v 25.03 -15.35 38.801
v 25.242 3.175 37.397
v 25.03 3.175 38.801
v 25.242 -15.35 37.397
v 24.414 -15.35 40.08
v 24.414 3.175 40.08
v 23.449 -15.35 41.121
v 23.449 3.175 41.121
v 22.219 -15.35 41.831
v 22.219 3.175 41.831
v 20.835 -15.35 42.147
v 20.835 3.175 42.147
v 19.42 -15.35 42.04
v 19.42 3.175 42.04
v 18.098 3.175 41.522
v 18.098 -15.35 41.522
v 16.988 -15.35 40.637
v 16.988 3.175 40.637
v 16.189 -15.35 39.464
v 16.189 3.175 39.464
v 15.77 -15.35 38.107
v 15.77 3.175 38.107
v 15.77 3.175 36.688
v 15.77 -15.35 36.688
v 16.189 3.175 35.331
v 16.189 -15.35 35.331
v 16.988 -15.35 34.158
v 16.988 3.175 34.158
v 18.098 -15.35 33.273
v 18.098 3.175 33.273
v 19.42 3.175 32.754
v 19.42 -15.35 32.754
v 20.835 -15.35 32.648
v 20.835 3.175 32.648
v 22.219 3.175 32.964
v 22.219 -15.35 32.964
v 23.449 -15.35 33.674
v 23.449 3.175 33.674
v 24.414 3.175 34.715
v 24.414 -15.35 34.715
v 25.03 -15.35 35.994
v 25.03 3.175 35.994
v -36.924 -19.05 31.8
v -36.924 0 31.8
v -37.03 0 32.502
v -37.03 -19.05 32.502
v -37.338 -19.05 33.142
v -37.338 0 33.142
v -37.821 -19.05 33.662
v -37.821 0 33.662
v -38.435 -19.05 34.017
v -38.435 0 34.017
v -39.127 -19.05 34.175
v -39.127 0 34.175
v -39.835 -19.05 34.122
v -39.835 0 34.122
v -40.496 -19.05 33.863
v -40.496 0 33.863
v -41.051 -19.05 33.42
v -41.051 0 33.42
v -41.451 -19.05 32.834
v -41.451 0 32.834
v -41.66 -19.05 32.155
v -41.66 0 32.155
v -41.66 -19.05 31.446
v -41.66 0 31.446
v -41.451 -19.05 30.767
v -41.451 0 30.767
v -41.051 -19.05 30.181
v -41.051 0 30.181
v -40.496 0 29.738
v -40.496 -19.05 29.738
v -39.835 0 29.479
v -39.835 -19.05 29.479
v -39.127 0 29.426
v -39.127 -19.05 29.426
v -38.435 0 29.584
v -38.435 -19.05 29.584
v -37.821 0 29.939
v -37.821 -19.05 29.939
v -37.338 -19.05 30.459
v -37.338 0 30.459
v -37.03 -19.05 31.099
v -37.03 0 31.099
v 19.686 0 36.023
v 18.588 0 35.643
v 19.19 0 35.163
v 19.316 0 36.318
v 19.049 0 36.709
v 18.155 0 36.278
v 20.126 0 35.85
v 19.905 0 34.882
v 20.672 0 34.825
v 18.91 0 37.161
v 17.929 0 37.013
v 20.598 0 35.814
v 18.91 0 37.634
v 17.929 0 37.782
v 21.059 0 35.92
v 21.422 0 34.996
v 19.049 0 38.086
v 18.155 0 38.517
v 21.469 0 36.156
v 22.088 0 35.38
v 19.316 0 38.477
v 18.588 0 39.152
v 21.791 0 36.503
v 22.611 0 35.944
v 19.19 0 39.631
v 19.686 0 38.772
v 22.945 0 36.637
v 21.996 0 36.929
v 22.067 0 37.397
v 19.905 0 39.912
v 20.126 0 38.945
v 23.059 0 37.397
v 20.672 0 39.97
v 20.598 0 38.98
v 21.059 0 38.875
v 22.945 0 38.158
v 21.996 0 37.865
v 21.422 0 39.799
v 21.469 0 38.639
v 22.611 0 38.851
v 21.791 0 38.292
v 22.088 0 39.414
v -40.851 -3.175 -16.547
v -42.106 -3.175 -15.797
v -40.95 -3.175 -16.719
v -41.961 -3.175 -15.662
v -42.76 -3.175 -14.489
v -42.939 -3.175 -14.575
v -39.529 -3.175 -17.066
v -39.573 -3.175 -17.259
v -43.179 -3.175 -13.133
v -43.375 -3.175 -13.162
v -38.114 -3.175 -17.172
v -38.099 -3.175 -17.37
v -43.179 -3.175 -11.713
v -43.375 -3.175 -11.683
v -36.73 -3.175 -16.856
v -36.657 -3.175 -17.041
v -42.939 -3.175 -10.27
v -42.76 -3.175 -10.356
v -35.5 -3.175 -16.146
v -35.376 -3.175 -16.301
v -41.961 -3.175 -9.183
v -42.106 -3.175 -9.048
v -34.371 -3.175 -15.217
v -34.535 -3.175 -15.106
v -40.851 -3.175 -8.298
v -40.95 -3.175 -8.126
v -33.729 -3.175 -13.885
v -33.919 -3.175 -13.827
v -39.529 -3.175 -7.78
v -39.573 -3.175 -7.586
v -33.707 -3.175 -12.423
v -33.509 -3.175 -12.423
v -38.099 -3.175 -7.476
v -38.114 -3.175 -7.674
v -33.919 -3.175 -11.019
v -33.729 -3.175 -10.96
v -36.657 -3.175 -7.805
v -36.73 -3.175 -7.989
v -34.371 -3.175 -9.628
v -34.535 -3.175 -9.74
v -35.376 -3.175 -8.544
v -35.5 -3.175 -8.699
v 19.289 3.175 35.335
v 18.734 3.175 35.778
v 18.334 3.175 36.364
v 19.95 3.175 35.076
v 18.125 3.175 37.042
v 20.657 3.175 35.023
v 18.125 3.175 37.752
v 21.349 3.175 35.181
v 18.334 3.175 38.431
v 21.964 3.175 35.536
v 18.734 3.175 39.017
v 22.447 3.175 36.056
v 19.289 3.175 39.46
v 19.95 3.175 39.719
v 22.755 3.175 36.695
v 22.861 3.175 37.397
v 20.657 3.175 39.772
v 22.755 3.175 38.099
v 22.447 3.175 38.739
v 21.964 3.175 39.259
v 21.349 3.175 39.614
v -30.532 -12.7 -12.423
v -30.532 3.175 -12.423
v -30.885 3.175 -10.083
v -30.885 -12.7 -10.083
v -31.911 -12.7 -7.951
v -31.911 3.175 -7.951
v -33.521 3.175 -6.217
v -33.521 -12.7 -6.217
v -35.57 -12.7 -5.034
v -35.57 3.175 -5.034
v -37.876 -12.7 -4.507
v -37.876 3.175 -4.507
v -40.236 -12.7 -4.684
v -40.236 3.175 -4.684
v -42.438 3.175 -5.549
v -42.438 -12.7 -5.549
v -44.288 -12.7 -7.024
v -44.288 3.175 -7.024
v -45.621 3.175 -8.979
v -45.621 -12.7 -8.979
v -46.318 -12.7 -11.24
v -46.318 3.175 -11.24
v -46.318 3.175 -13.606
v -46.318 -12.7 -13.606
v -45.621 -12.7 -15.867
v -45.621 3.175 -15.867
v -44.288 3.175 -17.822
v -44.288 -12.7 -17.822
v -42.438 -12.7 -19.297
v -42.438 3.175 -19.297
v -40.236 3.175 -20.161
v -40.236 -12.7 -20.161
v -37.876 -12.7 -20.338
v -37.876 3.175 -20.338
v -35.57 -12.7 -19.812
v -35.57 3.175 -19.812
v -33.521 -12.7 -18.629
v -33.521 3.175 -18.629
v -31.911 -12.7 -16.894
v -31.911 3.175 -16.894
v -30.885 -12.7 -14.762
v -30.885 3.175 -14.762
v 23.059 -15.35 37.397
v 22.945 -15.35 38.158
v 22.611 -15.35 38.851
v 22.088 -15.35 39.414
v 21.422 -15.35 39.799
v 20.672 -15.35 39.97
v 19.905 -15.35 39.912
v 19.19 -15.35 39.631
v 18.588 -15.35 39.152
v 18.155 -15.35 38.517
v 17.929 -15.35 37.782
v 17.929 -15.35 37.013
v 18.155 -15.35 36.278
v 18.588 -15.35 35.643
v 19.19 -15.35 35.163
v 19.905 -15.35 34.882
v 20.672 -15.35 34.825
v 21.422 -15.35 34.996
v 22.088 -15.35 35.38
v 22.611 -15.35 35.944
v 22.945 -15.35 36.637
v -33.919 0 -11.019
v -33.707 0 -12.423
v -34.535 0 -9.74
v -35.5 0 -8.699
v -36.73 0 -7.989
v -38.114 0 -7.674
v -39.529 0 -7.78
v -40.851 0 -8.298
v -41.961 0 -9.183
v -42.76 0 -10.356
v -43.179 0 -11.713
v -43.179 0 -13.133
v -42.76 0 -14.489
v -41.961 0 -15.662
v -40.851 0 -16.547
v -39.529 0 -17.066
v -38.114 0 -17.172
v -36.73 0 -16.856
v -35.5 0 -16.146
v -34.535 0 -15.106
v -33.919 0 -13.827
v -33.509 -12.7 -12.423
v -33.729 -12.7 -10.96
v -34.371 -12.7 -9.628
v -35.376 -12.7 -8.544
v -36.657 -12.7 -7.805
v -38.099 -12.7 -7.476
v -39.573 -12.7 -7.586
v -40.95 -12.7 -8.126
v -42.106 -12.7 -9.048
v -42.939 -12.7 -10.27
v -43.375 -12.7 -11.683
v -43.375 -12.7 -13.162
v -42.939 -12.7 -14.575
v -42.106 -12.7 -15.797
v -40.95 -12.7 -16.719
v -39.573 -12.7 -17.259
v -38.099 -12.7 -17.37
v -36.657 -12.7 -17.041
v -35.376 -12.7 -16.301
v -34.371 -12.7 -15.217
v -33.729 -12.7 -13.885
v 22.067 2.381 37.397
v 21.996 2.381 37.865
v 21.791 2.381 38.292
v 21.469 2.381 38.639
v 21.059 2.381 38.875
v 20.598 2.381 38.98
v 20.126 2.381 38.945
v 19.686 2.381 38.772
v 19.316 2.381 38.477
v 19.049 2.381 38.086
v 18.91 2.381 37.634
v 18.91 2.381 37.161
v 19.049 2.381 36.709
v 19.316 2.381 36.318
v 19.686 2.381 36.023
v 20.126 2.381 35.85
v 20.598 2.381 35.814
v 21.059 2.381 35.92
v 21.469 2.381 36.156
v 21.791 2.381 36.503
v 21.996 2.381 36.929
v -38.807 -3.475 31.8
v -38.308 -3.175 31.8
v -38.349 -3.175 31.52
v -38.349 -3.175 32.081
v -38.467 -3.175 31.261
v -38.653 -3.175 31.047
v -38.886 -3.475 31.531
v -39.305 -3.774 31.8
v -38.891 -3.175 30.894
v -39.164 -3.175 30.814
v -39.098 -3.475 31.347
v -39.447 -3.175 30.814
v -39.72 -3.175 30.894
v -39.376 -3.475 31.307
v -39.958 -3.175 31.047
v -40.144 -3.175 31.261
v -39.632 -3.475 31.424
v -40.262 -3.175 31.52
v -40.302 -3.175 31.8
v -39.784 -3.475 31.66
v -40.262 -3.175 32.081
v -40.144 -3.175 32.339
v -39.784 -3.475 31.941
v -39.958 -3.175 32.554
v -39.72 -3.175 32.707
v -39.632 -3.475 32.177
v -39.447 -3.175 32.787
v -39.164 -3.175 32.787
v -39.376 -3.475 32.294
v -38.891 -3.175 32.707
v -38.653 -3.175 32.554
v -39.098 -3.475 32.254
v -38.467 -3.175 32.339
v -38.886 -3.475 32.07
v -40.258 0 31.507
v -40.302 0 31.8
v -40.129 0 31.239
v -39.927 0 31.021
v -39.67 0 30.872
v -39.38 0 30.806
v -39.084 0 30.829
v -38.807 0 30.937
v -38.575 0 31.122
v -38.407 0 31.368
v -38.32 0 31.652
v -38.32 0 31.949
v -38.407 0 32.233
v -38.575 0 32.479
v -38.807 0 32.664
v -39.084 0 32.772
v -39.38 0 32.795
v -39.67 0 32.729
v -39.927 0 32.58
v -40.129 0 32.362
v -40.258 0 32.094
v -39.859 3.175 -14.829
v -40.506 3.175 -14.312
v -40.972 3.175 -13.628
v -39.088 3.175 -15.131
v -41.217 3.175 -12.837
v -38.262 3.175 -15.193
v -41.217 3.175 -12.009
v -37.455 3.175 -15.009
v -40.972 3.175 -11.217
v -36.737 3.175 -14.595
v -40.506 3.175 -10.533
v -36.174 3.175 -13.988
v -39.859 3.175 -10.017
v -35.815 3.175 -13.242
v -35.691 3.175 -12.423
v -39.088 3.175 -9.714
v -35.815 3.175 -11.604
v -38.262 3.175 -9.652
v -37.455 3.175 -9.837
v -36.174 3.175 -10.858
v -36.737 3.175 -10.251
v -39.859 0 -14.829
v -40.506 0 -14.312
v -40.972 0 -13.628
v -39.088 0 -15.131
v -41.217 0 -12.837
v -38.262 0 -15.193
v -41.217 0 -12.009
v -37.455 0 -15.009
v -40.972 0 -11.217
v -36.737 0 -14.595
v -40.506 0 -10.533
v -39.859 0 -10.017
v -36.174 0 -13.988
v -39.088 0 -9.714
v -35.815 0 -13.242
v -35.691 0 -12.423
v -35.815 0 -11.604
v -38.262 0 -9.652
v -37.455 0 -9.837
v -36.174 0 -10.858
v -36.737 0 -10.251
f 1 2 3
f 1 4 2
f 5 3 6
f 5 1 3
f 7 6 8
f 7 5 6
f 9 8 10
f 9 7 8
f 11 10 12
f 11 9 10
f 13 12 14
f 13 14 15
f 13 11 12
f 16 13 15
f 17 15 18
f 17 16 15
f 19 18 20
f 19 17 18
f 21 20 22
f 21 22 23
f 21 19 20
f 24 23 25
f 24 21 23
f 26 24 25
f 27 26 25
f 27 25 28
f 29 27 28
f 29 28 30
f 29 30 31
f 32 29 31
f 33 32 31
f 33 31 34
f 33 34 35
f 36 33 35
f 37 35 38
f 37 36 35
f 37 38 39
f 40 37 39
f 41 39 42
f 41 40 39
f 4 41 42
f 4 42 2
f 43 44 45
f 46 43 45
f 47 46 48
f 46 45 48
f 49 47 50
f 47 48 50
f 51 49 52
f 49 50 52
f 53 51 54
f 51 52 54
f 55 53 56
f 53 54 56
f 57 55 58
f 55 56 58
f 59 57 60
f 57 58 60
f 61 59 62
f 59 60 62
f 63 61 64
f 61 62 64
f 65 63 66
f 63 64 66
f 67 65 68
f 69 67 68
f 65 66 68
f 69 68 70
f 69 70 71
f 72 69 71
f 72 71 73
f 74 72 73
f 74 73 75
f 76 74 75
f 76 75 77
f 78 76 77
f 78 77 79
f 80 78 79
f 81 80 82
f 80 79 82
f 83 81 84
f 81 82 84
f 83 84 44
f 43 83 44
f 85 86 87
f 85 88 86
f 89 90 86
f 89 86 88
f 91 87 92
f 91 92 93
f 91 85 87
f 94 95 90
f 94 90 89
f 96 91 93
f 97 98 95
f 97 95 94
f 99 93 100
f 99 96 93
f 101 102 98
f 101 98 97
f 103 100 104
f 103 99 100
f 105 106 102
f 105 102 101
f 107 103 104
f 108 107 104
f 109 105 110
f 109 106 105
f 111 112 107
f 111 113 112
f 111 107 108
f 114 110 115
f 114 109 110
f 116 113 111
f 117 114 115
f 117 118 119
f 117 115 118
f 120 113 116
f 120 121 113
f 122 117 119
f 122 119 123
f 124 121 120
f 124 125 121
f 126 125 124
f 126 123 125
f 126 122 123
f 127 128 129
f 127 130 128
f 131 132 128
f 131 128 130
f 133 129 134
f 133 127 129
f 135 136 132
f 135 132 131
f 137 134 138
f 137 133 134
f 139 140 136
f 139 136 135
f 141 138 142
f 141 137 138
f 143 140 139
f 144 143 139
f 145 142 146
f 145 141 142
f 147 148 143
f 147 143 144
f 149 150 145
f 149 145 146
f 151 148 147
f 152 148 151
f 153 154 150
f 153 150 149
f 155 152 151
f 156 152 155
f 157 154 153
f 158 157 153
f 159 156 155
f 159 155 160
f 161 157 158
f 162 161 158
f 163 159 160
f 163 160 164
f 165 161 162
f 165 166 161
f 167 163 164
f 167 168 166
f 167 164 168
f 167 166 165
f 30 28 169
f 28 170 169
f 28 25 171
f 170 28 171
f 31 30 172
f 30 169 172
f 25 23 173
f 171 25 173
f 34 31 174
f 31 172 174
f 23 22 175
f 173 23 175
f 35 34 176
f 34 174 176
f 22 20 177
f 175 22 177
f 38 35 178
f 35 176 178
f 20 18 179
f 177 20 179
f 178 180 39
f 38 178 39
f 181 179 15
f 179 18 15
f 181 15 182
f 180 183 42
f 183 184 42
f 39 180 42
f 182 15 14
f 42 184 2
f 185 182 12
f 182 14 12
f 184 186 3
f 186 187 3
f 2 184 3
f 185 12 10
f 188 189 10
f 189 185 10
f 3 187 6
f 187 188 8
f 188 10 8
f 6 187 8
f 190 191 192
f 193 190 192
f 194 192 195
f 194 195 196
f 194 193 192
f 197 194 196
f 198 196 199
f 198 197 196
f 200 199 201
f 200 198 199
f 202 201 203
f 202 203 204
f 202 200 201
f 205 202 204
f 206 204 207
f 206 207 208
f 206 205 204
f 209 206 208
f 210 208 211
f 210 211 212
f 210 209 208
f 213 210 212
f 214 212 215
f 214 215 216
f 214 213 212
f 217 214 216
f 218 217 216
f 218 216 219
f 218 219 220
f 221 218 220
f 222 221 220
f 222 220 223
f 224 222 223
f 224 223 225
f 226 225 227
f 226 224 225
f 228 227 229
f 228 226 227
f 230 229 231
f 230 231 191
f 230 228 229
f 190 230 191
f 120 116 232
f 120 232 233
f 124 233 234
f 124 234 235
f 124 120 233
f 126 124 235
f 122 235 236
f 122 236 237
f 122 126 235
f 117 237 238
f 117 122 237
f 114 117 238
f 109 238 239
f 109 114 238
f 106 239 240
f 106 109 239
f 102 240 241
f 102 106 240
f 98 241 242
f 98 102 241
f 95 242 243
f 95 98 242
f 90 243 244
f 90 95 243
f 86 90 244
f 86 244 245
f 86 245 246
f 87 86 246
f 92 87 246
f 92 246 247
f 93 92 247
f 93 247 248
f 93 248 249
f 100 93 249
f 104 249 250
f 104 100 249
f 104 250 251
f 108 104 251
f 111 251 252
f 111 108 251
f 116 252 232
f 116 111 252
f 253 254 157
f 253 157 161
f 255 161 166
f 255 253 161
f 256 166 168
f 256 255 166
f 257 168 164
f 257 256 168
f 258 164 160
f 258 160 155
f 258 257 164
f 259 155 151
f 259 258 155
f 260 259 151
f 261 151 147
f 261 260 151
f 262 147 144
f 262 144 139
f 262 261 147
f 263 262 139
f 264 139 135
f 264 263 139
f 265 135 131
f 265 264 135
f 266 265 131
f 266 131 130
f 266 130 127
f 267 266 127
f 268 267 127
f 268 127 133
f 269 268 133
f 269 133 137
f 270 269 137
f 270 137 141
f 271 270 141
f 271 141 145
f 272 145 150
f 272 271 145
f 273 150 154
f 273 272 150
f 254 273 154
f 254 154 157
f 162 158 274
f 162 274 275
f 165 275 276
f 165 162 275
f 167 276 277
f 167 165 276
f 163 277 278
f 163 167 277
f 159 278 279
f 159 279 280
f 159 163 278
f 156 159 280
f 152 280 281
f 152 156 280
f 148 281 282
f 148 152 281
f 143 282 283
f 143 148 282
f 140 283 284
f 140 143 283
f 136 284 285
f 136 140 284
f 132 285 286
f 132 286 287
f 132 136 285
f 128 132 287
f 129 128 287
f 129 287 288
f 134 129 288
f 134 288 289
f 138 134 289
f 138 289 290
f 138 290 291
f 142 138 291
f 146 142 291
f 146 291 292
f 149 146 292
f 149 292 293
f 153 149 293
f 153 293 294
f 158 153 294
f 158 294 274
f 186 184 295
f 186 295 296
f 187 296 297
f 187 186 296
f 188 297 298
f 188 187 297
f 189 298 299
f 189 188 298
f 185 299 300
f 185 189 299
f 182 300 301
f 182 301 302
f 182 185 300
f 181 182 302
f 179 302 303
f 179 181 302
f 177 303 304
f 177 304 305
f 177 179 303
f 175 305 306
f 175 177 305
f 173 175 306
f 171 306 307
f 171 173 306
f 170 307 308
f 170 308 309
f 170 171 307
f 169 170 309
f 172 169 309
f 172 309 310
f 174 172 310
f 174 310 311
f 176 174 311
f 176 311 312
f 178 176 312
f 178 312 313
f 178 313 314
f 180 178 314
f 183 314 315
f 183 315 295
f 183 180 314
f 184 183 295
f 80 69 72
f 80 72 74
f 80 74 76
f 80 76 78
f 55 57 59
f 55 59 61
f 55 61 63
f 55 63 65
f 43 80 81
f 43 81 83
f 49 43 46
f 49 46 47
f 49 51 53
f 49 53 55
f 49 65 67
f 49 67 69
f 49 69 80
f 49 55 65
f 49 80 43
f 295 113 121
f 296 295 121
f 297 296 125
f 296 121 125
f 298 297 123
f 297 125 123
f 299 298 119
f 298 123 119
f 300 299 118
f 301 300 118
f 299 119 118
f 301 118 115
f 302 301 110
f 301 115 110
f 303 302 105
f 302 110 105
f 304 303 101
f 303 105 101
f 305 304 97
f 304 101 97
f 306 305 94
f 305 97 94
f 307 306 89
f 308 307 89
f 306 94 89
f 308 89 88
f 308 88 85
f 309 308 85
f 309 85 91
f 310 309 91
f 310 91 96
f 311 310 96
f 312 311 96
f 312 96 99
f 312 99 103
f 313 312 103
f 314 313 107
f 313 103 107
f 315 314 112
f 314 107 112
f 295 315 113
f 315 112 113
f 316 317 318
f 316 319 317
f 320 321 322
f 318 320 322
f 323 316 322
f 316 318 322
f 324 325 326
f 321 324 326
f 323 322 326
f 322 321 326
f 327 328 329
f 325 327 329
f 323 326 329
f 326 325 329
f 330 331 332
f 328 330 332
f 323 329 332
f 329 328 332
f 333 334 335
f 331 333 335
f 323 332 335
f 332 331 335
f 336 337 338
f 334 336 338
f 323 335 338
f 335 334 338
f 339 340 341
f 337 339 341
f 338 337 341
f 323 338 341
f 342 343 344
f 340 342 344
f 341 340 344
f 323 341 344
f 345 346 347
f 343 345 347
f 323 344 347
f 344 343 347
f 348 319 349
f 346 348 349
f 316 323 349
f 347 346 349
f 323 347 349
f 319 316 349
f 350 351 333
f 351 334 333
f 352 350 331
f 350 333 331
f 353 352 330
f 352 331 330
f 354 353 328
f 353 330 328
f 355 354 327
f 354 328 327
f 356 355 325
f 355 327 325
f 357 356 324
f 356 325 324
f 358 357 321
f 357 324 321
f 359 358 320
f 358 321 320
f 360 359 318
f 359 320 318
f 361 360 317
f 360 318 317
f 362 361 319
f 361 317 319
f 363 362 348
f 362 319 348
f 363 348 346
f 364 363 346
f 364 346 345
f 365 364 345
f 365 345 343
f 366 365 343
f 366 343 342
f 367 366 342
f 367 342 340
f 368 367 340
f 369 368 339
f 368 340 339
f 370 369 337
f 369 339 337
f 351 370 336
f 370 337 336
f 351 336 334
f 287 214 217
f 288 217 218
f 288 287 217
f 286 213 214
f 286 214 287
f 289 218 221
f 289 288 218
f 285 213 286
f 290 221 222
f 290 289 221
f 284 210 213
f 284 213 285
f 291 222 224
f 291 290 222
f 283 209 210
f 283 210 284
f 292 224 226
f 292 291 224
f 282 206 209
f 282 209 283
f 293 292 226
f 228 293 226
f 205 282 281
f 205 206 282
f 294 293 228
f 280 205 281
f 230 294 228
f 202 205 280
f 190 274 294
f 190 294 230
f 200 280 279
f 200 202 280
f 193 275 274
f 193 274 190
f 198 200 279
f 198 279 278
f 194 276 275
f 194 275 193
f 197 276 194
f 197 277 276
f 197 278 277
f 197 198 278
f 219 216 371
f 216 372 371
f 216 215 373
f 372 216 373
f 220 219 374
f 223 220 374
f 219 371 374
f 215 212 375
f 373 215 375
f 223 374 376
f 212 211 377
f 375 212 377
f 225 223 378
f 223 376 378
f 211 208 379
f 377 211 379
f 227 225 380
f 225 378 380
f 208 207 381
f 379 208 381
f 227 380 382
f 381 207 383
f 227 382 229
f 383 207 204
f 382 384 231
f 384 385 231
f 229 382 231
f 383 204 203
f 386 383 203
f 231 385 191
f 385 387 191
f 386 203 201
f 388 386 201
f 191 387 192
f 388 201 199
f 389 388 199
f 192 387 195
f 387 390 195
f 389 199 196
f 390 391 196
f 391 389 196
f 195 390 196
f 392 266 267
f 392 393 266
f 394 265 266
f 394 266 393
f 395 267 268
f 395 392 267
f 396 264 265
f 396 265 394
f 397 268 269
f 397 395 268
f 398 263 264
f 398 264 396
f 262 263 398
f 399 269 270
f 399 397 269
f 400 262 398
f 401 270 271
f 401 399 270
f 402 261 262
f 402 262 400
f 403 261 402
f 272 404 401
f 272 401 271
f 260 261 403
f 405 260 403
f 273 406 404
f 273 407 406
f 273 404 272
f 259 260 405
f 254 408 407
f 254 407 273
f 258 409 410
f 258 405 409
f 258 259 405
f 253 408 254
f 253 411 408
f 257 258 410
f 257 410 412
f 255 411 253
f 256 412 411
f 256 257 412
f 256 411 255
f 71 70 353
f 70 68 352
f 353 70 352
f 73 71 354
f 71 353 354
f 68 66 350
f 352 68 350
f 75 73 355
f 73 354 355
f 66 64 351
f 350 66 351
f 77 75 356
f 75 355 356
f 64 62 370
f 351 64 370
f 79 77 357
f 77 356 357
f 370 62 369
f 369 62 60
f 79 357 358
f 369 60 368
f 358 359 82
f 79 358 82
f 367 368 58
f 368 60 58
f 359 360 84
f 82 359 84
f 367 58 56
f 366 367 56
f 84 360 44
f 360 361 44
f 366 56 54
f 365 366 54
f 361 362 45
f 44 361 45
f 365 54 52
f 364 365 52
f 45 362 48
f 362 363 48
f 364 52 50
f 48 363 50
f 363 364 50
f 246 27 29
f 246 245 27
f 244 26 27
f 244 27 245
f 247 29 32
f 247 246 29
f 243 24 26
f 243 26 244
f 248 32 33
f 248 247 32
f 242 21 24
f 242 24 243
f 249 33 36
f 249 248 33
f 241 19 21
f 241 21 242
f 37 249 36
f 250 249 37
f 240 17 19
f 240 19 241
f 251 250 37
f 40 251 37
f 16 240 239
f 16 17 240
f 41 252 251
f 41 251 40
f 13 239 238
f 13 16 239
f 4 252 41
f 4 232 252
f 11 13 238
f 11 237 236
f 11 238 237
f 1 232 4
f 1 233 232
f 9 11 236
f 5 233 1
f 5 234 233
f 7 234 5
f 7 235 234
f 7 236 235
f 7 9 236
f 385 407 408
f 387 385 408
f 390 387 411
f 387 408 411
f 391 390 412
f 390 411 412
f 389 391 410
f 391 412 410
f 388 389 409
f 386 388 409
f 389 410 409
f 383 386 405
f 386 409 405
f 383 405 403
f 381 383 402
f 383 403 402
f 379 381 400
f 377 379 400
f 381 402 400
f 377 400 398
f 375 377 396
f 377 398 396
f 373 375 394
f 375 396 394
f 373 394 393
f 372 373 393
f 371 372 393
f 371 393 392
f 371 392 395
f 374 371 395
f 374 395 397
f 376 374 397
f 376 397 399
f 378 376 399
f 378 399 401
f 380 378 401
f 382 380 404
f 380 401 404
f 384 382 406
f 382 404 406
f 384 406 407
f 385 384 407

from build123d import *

# Parameters (mm, degrees)
F0_R      = 2.38125
F1_DEPTH  = 19.05
F2_R      = 4.7625
F2_R_2    = 2.5796875
F3_DEPTH  = 15.35
F2_R_3    = 1.5875
F4_DEPTH  = 3.175
F5_SIZE   = 0.79375
F6_R      = 7.9375
F6_R_2    = 4.9609375
F7_DEPTH  = 12.7
F6_R_3    = 4.7625
F6_R_4    = 2.778125
F8_DEPTH  = 3.175
F9_DEPTH  = 3.175
F10_D     = 1.9939
F10_DEPTH = 3.175
F10_TIP   = 0.5990279941


# Not quite as in the source:
# - a length typed as a fraction of an inch, garbled in the dataset ("3 / 203.2 mm" for 3/8 in), is restored


with BuildPart() as f1:
    # F0 (on Front) → F1 (new body)
    with BuildSketch(Plane.XZ):
        with Locations((-39.3053889275, 31.8004786968)):
            Circle(F0_R)
    extrude(amount=F1_DEPTH)

    # F10
    with Locations(Plane(origin=(0, 0, 0), x_dir=(1, 0, 0), z_dir=(0, 1, 0))):
        with Locations((-39.3053889275, -31.8004786968)):
            Hole(F10_D / 2, depth=F10_DEPTH)
            with Locations((0, 0, -(F10_DEPTH + F10_TIP / 2))):  # 118° drill point
                Cone(0, F10_D / 2, F10_TIP, mode=Mode.SUBTRACT)


with BuildPart() as f3:
    # F2 (on Front) → F3 (new body)
    with BuildSketch(Plane.XZ):
        with Locations((20.4795077443, 37.3973622918)):
            Circle(F2_R)
        with Locations((20.4795077443, 37.3973622918)):
            Circle(F2_R_2, mode=Mode.SUBTRACT)
    extrude(amount=F3_DEPTH)

    # F2 (on Front) → F4 (join)
    with BuildSketch(Plane.XZ):
        with Locations((20.4795077443, 37.3973622918)):
            Circle(F2_R)
        with Locations((20.4795077443, 37.3973622918)):
            Circle(F2_R_2, mode=Mode.SUBTRACT)
        with Locations((20.4795077443, 37.3973622918)):
            Circle(F2_R_2)
        with Locations((20.4795077443, 37.3973622918)):
            Circle(F2_R_3, mode=Mode.SUBTRACT)
    extrude(amount=-F4_DEPTH)

    # F5
    f5_edges = [f3.edges().sort_by_distance(p)[0] for p in [
        (18.892008, 3.175, 37.397362),
    ]]
    chamfer(f5_edges, length=F5_SIZE)


with BuildPart() as f7:
    # F6 (on Front) → F7 (new body)
    with BuildSketch(Plane.XZ):
        with Locations((-38.4694747627, -12.4227562919)):
            Circle(F6_R)
        with Locations((-38.4694747627, -12.4227562919)):
            Circle(F6_R_2, mode=Mode.SUBTRACT)
    extrude(amount=F7_DEPTH)

    # F6 (on Front) → F8 (join)
    with BuildSketch(Plane.XZ):
        with Locations((-38.4694747627, -12.4227562919)):
            Circle(F6_R)
        with Locations((-38.4694747627, -12.4227562919)):
            Circle(F6_R_2, mode=Mode.SUBTRACT)
        with Locations((-38.4694747627, -12.4227562919)):
            Circle(F6_R_2)
        with Locations((-38.4694747627, -12.4227562919)):
            Circle(F6_R_3, mode=Mode.SUBTRACT)
        with Locations((-38.4694747627, -12.4227562919)):
            Circle(F6_R_3)
        with Locations((-38.4694747627, -12.4227562919)):
            Circle(F6_R_4, mode=Mode.SUBTRACT)
    extrude(amount=-F8_DEPTH)

    # F6 (on Front) → F9 (join)
    with BuildSketch(Plane.XZ):
        with Locations((-38.4694747627, -12.4227562919)):
            Circle(F6_R_2)
        with Locations((-38.4694747627, -12.4227562919)):
            Circle(F6_R_3, mode=Mode.SUBTRACT)
    extrude(amount=F9_DEPTH)


solid = Compound([f1.part, f3.part, f7.part])
